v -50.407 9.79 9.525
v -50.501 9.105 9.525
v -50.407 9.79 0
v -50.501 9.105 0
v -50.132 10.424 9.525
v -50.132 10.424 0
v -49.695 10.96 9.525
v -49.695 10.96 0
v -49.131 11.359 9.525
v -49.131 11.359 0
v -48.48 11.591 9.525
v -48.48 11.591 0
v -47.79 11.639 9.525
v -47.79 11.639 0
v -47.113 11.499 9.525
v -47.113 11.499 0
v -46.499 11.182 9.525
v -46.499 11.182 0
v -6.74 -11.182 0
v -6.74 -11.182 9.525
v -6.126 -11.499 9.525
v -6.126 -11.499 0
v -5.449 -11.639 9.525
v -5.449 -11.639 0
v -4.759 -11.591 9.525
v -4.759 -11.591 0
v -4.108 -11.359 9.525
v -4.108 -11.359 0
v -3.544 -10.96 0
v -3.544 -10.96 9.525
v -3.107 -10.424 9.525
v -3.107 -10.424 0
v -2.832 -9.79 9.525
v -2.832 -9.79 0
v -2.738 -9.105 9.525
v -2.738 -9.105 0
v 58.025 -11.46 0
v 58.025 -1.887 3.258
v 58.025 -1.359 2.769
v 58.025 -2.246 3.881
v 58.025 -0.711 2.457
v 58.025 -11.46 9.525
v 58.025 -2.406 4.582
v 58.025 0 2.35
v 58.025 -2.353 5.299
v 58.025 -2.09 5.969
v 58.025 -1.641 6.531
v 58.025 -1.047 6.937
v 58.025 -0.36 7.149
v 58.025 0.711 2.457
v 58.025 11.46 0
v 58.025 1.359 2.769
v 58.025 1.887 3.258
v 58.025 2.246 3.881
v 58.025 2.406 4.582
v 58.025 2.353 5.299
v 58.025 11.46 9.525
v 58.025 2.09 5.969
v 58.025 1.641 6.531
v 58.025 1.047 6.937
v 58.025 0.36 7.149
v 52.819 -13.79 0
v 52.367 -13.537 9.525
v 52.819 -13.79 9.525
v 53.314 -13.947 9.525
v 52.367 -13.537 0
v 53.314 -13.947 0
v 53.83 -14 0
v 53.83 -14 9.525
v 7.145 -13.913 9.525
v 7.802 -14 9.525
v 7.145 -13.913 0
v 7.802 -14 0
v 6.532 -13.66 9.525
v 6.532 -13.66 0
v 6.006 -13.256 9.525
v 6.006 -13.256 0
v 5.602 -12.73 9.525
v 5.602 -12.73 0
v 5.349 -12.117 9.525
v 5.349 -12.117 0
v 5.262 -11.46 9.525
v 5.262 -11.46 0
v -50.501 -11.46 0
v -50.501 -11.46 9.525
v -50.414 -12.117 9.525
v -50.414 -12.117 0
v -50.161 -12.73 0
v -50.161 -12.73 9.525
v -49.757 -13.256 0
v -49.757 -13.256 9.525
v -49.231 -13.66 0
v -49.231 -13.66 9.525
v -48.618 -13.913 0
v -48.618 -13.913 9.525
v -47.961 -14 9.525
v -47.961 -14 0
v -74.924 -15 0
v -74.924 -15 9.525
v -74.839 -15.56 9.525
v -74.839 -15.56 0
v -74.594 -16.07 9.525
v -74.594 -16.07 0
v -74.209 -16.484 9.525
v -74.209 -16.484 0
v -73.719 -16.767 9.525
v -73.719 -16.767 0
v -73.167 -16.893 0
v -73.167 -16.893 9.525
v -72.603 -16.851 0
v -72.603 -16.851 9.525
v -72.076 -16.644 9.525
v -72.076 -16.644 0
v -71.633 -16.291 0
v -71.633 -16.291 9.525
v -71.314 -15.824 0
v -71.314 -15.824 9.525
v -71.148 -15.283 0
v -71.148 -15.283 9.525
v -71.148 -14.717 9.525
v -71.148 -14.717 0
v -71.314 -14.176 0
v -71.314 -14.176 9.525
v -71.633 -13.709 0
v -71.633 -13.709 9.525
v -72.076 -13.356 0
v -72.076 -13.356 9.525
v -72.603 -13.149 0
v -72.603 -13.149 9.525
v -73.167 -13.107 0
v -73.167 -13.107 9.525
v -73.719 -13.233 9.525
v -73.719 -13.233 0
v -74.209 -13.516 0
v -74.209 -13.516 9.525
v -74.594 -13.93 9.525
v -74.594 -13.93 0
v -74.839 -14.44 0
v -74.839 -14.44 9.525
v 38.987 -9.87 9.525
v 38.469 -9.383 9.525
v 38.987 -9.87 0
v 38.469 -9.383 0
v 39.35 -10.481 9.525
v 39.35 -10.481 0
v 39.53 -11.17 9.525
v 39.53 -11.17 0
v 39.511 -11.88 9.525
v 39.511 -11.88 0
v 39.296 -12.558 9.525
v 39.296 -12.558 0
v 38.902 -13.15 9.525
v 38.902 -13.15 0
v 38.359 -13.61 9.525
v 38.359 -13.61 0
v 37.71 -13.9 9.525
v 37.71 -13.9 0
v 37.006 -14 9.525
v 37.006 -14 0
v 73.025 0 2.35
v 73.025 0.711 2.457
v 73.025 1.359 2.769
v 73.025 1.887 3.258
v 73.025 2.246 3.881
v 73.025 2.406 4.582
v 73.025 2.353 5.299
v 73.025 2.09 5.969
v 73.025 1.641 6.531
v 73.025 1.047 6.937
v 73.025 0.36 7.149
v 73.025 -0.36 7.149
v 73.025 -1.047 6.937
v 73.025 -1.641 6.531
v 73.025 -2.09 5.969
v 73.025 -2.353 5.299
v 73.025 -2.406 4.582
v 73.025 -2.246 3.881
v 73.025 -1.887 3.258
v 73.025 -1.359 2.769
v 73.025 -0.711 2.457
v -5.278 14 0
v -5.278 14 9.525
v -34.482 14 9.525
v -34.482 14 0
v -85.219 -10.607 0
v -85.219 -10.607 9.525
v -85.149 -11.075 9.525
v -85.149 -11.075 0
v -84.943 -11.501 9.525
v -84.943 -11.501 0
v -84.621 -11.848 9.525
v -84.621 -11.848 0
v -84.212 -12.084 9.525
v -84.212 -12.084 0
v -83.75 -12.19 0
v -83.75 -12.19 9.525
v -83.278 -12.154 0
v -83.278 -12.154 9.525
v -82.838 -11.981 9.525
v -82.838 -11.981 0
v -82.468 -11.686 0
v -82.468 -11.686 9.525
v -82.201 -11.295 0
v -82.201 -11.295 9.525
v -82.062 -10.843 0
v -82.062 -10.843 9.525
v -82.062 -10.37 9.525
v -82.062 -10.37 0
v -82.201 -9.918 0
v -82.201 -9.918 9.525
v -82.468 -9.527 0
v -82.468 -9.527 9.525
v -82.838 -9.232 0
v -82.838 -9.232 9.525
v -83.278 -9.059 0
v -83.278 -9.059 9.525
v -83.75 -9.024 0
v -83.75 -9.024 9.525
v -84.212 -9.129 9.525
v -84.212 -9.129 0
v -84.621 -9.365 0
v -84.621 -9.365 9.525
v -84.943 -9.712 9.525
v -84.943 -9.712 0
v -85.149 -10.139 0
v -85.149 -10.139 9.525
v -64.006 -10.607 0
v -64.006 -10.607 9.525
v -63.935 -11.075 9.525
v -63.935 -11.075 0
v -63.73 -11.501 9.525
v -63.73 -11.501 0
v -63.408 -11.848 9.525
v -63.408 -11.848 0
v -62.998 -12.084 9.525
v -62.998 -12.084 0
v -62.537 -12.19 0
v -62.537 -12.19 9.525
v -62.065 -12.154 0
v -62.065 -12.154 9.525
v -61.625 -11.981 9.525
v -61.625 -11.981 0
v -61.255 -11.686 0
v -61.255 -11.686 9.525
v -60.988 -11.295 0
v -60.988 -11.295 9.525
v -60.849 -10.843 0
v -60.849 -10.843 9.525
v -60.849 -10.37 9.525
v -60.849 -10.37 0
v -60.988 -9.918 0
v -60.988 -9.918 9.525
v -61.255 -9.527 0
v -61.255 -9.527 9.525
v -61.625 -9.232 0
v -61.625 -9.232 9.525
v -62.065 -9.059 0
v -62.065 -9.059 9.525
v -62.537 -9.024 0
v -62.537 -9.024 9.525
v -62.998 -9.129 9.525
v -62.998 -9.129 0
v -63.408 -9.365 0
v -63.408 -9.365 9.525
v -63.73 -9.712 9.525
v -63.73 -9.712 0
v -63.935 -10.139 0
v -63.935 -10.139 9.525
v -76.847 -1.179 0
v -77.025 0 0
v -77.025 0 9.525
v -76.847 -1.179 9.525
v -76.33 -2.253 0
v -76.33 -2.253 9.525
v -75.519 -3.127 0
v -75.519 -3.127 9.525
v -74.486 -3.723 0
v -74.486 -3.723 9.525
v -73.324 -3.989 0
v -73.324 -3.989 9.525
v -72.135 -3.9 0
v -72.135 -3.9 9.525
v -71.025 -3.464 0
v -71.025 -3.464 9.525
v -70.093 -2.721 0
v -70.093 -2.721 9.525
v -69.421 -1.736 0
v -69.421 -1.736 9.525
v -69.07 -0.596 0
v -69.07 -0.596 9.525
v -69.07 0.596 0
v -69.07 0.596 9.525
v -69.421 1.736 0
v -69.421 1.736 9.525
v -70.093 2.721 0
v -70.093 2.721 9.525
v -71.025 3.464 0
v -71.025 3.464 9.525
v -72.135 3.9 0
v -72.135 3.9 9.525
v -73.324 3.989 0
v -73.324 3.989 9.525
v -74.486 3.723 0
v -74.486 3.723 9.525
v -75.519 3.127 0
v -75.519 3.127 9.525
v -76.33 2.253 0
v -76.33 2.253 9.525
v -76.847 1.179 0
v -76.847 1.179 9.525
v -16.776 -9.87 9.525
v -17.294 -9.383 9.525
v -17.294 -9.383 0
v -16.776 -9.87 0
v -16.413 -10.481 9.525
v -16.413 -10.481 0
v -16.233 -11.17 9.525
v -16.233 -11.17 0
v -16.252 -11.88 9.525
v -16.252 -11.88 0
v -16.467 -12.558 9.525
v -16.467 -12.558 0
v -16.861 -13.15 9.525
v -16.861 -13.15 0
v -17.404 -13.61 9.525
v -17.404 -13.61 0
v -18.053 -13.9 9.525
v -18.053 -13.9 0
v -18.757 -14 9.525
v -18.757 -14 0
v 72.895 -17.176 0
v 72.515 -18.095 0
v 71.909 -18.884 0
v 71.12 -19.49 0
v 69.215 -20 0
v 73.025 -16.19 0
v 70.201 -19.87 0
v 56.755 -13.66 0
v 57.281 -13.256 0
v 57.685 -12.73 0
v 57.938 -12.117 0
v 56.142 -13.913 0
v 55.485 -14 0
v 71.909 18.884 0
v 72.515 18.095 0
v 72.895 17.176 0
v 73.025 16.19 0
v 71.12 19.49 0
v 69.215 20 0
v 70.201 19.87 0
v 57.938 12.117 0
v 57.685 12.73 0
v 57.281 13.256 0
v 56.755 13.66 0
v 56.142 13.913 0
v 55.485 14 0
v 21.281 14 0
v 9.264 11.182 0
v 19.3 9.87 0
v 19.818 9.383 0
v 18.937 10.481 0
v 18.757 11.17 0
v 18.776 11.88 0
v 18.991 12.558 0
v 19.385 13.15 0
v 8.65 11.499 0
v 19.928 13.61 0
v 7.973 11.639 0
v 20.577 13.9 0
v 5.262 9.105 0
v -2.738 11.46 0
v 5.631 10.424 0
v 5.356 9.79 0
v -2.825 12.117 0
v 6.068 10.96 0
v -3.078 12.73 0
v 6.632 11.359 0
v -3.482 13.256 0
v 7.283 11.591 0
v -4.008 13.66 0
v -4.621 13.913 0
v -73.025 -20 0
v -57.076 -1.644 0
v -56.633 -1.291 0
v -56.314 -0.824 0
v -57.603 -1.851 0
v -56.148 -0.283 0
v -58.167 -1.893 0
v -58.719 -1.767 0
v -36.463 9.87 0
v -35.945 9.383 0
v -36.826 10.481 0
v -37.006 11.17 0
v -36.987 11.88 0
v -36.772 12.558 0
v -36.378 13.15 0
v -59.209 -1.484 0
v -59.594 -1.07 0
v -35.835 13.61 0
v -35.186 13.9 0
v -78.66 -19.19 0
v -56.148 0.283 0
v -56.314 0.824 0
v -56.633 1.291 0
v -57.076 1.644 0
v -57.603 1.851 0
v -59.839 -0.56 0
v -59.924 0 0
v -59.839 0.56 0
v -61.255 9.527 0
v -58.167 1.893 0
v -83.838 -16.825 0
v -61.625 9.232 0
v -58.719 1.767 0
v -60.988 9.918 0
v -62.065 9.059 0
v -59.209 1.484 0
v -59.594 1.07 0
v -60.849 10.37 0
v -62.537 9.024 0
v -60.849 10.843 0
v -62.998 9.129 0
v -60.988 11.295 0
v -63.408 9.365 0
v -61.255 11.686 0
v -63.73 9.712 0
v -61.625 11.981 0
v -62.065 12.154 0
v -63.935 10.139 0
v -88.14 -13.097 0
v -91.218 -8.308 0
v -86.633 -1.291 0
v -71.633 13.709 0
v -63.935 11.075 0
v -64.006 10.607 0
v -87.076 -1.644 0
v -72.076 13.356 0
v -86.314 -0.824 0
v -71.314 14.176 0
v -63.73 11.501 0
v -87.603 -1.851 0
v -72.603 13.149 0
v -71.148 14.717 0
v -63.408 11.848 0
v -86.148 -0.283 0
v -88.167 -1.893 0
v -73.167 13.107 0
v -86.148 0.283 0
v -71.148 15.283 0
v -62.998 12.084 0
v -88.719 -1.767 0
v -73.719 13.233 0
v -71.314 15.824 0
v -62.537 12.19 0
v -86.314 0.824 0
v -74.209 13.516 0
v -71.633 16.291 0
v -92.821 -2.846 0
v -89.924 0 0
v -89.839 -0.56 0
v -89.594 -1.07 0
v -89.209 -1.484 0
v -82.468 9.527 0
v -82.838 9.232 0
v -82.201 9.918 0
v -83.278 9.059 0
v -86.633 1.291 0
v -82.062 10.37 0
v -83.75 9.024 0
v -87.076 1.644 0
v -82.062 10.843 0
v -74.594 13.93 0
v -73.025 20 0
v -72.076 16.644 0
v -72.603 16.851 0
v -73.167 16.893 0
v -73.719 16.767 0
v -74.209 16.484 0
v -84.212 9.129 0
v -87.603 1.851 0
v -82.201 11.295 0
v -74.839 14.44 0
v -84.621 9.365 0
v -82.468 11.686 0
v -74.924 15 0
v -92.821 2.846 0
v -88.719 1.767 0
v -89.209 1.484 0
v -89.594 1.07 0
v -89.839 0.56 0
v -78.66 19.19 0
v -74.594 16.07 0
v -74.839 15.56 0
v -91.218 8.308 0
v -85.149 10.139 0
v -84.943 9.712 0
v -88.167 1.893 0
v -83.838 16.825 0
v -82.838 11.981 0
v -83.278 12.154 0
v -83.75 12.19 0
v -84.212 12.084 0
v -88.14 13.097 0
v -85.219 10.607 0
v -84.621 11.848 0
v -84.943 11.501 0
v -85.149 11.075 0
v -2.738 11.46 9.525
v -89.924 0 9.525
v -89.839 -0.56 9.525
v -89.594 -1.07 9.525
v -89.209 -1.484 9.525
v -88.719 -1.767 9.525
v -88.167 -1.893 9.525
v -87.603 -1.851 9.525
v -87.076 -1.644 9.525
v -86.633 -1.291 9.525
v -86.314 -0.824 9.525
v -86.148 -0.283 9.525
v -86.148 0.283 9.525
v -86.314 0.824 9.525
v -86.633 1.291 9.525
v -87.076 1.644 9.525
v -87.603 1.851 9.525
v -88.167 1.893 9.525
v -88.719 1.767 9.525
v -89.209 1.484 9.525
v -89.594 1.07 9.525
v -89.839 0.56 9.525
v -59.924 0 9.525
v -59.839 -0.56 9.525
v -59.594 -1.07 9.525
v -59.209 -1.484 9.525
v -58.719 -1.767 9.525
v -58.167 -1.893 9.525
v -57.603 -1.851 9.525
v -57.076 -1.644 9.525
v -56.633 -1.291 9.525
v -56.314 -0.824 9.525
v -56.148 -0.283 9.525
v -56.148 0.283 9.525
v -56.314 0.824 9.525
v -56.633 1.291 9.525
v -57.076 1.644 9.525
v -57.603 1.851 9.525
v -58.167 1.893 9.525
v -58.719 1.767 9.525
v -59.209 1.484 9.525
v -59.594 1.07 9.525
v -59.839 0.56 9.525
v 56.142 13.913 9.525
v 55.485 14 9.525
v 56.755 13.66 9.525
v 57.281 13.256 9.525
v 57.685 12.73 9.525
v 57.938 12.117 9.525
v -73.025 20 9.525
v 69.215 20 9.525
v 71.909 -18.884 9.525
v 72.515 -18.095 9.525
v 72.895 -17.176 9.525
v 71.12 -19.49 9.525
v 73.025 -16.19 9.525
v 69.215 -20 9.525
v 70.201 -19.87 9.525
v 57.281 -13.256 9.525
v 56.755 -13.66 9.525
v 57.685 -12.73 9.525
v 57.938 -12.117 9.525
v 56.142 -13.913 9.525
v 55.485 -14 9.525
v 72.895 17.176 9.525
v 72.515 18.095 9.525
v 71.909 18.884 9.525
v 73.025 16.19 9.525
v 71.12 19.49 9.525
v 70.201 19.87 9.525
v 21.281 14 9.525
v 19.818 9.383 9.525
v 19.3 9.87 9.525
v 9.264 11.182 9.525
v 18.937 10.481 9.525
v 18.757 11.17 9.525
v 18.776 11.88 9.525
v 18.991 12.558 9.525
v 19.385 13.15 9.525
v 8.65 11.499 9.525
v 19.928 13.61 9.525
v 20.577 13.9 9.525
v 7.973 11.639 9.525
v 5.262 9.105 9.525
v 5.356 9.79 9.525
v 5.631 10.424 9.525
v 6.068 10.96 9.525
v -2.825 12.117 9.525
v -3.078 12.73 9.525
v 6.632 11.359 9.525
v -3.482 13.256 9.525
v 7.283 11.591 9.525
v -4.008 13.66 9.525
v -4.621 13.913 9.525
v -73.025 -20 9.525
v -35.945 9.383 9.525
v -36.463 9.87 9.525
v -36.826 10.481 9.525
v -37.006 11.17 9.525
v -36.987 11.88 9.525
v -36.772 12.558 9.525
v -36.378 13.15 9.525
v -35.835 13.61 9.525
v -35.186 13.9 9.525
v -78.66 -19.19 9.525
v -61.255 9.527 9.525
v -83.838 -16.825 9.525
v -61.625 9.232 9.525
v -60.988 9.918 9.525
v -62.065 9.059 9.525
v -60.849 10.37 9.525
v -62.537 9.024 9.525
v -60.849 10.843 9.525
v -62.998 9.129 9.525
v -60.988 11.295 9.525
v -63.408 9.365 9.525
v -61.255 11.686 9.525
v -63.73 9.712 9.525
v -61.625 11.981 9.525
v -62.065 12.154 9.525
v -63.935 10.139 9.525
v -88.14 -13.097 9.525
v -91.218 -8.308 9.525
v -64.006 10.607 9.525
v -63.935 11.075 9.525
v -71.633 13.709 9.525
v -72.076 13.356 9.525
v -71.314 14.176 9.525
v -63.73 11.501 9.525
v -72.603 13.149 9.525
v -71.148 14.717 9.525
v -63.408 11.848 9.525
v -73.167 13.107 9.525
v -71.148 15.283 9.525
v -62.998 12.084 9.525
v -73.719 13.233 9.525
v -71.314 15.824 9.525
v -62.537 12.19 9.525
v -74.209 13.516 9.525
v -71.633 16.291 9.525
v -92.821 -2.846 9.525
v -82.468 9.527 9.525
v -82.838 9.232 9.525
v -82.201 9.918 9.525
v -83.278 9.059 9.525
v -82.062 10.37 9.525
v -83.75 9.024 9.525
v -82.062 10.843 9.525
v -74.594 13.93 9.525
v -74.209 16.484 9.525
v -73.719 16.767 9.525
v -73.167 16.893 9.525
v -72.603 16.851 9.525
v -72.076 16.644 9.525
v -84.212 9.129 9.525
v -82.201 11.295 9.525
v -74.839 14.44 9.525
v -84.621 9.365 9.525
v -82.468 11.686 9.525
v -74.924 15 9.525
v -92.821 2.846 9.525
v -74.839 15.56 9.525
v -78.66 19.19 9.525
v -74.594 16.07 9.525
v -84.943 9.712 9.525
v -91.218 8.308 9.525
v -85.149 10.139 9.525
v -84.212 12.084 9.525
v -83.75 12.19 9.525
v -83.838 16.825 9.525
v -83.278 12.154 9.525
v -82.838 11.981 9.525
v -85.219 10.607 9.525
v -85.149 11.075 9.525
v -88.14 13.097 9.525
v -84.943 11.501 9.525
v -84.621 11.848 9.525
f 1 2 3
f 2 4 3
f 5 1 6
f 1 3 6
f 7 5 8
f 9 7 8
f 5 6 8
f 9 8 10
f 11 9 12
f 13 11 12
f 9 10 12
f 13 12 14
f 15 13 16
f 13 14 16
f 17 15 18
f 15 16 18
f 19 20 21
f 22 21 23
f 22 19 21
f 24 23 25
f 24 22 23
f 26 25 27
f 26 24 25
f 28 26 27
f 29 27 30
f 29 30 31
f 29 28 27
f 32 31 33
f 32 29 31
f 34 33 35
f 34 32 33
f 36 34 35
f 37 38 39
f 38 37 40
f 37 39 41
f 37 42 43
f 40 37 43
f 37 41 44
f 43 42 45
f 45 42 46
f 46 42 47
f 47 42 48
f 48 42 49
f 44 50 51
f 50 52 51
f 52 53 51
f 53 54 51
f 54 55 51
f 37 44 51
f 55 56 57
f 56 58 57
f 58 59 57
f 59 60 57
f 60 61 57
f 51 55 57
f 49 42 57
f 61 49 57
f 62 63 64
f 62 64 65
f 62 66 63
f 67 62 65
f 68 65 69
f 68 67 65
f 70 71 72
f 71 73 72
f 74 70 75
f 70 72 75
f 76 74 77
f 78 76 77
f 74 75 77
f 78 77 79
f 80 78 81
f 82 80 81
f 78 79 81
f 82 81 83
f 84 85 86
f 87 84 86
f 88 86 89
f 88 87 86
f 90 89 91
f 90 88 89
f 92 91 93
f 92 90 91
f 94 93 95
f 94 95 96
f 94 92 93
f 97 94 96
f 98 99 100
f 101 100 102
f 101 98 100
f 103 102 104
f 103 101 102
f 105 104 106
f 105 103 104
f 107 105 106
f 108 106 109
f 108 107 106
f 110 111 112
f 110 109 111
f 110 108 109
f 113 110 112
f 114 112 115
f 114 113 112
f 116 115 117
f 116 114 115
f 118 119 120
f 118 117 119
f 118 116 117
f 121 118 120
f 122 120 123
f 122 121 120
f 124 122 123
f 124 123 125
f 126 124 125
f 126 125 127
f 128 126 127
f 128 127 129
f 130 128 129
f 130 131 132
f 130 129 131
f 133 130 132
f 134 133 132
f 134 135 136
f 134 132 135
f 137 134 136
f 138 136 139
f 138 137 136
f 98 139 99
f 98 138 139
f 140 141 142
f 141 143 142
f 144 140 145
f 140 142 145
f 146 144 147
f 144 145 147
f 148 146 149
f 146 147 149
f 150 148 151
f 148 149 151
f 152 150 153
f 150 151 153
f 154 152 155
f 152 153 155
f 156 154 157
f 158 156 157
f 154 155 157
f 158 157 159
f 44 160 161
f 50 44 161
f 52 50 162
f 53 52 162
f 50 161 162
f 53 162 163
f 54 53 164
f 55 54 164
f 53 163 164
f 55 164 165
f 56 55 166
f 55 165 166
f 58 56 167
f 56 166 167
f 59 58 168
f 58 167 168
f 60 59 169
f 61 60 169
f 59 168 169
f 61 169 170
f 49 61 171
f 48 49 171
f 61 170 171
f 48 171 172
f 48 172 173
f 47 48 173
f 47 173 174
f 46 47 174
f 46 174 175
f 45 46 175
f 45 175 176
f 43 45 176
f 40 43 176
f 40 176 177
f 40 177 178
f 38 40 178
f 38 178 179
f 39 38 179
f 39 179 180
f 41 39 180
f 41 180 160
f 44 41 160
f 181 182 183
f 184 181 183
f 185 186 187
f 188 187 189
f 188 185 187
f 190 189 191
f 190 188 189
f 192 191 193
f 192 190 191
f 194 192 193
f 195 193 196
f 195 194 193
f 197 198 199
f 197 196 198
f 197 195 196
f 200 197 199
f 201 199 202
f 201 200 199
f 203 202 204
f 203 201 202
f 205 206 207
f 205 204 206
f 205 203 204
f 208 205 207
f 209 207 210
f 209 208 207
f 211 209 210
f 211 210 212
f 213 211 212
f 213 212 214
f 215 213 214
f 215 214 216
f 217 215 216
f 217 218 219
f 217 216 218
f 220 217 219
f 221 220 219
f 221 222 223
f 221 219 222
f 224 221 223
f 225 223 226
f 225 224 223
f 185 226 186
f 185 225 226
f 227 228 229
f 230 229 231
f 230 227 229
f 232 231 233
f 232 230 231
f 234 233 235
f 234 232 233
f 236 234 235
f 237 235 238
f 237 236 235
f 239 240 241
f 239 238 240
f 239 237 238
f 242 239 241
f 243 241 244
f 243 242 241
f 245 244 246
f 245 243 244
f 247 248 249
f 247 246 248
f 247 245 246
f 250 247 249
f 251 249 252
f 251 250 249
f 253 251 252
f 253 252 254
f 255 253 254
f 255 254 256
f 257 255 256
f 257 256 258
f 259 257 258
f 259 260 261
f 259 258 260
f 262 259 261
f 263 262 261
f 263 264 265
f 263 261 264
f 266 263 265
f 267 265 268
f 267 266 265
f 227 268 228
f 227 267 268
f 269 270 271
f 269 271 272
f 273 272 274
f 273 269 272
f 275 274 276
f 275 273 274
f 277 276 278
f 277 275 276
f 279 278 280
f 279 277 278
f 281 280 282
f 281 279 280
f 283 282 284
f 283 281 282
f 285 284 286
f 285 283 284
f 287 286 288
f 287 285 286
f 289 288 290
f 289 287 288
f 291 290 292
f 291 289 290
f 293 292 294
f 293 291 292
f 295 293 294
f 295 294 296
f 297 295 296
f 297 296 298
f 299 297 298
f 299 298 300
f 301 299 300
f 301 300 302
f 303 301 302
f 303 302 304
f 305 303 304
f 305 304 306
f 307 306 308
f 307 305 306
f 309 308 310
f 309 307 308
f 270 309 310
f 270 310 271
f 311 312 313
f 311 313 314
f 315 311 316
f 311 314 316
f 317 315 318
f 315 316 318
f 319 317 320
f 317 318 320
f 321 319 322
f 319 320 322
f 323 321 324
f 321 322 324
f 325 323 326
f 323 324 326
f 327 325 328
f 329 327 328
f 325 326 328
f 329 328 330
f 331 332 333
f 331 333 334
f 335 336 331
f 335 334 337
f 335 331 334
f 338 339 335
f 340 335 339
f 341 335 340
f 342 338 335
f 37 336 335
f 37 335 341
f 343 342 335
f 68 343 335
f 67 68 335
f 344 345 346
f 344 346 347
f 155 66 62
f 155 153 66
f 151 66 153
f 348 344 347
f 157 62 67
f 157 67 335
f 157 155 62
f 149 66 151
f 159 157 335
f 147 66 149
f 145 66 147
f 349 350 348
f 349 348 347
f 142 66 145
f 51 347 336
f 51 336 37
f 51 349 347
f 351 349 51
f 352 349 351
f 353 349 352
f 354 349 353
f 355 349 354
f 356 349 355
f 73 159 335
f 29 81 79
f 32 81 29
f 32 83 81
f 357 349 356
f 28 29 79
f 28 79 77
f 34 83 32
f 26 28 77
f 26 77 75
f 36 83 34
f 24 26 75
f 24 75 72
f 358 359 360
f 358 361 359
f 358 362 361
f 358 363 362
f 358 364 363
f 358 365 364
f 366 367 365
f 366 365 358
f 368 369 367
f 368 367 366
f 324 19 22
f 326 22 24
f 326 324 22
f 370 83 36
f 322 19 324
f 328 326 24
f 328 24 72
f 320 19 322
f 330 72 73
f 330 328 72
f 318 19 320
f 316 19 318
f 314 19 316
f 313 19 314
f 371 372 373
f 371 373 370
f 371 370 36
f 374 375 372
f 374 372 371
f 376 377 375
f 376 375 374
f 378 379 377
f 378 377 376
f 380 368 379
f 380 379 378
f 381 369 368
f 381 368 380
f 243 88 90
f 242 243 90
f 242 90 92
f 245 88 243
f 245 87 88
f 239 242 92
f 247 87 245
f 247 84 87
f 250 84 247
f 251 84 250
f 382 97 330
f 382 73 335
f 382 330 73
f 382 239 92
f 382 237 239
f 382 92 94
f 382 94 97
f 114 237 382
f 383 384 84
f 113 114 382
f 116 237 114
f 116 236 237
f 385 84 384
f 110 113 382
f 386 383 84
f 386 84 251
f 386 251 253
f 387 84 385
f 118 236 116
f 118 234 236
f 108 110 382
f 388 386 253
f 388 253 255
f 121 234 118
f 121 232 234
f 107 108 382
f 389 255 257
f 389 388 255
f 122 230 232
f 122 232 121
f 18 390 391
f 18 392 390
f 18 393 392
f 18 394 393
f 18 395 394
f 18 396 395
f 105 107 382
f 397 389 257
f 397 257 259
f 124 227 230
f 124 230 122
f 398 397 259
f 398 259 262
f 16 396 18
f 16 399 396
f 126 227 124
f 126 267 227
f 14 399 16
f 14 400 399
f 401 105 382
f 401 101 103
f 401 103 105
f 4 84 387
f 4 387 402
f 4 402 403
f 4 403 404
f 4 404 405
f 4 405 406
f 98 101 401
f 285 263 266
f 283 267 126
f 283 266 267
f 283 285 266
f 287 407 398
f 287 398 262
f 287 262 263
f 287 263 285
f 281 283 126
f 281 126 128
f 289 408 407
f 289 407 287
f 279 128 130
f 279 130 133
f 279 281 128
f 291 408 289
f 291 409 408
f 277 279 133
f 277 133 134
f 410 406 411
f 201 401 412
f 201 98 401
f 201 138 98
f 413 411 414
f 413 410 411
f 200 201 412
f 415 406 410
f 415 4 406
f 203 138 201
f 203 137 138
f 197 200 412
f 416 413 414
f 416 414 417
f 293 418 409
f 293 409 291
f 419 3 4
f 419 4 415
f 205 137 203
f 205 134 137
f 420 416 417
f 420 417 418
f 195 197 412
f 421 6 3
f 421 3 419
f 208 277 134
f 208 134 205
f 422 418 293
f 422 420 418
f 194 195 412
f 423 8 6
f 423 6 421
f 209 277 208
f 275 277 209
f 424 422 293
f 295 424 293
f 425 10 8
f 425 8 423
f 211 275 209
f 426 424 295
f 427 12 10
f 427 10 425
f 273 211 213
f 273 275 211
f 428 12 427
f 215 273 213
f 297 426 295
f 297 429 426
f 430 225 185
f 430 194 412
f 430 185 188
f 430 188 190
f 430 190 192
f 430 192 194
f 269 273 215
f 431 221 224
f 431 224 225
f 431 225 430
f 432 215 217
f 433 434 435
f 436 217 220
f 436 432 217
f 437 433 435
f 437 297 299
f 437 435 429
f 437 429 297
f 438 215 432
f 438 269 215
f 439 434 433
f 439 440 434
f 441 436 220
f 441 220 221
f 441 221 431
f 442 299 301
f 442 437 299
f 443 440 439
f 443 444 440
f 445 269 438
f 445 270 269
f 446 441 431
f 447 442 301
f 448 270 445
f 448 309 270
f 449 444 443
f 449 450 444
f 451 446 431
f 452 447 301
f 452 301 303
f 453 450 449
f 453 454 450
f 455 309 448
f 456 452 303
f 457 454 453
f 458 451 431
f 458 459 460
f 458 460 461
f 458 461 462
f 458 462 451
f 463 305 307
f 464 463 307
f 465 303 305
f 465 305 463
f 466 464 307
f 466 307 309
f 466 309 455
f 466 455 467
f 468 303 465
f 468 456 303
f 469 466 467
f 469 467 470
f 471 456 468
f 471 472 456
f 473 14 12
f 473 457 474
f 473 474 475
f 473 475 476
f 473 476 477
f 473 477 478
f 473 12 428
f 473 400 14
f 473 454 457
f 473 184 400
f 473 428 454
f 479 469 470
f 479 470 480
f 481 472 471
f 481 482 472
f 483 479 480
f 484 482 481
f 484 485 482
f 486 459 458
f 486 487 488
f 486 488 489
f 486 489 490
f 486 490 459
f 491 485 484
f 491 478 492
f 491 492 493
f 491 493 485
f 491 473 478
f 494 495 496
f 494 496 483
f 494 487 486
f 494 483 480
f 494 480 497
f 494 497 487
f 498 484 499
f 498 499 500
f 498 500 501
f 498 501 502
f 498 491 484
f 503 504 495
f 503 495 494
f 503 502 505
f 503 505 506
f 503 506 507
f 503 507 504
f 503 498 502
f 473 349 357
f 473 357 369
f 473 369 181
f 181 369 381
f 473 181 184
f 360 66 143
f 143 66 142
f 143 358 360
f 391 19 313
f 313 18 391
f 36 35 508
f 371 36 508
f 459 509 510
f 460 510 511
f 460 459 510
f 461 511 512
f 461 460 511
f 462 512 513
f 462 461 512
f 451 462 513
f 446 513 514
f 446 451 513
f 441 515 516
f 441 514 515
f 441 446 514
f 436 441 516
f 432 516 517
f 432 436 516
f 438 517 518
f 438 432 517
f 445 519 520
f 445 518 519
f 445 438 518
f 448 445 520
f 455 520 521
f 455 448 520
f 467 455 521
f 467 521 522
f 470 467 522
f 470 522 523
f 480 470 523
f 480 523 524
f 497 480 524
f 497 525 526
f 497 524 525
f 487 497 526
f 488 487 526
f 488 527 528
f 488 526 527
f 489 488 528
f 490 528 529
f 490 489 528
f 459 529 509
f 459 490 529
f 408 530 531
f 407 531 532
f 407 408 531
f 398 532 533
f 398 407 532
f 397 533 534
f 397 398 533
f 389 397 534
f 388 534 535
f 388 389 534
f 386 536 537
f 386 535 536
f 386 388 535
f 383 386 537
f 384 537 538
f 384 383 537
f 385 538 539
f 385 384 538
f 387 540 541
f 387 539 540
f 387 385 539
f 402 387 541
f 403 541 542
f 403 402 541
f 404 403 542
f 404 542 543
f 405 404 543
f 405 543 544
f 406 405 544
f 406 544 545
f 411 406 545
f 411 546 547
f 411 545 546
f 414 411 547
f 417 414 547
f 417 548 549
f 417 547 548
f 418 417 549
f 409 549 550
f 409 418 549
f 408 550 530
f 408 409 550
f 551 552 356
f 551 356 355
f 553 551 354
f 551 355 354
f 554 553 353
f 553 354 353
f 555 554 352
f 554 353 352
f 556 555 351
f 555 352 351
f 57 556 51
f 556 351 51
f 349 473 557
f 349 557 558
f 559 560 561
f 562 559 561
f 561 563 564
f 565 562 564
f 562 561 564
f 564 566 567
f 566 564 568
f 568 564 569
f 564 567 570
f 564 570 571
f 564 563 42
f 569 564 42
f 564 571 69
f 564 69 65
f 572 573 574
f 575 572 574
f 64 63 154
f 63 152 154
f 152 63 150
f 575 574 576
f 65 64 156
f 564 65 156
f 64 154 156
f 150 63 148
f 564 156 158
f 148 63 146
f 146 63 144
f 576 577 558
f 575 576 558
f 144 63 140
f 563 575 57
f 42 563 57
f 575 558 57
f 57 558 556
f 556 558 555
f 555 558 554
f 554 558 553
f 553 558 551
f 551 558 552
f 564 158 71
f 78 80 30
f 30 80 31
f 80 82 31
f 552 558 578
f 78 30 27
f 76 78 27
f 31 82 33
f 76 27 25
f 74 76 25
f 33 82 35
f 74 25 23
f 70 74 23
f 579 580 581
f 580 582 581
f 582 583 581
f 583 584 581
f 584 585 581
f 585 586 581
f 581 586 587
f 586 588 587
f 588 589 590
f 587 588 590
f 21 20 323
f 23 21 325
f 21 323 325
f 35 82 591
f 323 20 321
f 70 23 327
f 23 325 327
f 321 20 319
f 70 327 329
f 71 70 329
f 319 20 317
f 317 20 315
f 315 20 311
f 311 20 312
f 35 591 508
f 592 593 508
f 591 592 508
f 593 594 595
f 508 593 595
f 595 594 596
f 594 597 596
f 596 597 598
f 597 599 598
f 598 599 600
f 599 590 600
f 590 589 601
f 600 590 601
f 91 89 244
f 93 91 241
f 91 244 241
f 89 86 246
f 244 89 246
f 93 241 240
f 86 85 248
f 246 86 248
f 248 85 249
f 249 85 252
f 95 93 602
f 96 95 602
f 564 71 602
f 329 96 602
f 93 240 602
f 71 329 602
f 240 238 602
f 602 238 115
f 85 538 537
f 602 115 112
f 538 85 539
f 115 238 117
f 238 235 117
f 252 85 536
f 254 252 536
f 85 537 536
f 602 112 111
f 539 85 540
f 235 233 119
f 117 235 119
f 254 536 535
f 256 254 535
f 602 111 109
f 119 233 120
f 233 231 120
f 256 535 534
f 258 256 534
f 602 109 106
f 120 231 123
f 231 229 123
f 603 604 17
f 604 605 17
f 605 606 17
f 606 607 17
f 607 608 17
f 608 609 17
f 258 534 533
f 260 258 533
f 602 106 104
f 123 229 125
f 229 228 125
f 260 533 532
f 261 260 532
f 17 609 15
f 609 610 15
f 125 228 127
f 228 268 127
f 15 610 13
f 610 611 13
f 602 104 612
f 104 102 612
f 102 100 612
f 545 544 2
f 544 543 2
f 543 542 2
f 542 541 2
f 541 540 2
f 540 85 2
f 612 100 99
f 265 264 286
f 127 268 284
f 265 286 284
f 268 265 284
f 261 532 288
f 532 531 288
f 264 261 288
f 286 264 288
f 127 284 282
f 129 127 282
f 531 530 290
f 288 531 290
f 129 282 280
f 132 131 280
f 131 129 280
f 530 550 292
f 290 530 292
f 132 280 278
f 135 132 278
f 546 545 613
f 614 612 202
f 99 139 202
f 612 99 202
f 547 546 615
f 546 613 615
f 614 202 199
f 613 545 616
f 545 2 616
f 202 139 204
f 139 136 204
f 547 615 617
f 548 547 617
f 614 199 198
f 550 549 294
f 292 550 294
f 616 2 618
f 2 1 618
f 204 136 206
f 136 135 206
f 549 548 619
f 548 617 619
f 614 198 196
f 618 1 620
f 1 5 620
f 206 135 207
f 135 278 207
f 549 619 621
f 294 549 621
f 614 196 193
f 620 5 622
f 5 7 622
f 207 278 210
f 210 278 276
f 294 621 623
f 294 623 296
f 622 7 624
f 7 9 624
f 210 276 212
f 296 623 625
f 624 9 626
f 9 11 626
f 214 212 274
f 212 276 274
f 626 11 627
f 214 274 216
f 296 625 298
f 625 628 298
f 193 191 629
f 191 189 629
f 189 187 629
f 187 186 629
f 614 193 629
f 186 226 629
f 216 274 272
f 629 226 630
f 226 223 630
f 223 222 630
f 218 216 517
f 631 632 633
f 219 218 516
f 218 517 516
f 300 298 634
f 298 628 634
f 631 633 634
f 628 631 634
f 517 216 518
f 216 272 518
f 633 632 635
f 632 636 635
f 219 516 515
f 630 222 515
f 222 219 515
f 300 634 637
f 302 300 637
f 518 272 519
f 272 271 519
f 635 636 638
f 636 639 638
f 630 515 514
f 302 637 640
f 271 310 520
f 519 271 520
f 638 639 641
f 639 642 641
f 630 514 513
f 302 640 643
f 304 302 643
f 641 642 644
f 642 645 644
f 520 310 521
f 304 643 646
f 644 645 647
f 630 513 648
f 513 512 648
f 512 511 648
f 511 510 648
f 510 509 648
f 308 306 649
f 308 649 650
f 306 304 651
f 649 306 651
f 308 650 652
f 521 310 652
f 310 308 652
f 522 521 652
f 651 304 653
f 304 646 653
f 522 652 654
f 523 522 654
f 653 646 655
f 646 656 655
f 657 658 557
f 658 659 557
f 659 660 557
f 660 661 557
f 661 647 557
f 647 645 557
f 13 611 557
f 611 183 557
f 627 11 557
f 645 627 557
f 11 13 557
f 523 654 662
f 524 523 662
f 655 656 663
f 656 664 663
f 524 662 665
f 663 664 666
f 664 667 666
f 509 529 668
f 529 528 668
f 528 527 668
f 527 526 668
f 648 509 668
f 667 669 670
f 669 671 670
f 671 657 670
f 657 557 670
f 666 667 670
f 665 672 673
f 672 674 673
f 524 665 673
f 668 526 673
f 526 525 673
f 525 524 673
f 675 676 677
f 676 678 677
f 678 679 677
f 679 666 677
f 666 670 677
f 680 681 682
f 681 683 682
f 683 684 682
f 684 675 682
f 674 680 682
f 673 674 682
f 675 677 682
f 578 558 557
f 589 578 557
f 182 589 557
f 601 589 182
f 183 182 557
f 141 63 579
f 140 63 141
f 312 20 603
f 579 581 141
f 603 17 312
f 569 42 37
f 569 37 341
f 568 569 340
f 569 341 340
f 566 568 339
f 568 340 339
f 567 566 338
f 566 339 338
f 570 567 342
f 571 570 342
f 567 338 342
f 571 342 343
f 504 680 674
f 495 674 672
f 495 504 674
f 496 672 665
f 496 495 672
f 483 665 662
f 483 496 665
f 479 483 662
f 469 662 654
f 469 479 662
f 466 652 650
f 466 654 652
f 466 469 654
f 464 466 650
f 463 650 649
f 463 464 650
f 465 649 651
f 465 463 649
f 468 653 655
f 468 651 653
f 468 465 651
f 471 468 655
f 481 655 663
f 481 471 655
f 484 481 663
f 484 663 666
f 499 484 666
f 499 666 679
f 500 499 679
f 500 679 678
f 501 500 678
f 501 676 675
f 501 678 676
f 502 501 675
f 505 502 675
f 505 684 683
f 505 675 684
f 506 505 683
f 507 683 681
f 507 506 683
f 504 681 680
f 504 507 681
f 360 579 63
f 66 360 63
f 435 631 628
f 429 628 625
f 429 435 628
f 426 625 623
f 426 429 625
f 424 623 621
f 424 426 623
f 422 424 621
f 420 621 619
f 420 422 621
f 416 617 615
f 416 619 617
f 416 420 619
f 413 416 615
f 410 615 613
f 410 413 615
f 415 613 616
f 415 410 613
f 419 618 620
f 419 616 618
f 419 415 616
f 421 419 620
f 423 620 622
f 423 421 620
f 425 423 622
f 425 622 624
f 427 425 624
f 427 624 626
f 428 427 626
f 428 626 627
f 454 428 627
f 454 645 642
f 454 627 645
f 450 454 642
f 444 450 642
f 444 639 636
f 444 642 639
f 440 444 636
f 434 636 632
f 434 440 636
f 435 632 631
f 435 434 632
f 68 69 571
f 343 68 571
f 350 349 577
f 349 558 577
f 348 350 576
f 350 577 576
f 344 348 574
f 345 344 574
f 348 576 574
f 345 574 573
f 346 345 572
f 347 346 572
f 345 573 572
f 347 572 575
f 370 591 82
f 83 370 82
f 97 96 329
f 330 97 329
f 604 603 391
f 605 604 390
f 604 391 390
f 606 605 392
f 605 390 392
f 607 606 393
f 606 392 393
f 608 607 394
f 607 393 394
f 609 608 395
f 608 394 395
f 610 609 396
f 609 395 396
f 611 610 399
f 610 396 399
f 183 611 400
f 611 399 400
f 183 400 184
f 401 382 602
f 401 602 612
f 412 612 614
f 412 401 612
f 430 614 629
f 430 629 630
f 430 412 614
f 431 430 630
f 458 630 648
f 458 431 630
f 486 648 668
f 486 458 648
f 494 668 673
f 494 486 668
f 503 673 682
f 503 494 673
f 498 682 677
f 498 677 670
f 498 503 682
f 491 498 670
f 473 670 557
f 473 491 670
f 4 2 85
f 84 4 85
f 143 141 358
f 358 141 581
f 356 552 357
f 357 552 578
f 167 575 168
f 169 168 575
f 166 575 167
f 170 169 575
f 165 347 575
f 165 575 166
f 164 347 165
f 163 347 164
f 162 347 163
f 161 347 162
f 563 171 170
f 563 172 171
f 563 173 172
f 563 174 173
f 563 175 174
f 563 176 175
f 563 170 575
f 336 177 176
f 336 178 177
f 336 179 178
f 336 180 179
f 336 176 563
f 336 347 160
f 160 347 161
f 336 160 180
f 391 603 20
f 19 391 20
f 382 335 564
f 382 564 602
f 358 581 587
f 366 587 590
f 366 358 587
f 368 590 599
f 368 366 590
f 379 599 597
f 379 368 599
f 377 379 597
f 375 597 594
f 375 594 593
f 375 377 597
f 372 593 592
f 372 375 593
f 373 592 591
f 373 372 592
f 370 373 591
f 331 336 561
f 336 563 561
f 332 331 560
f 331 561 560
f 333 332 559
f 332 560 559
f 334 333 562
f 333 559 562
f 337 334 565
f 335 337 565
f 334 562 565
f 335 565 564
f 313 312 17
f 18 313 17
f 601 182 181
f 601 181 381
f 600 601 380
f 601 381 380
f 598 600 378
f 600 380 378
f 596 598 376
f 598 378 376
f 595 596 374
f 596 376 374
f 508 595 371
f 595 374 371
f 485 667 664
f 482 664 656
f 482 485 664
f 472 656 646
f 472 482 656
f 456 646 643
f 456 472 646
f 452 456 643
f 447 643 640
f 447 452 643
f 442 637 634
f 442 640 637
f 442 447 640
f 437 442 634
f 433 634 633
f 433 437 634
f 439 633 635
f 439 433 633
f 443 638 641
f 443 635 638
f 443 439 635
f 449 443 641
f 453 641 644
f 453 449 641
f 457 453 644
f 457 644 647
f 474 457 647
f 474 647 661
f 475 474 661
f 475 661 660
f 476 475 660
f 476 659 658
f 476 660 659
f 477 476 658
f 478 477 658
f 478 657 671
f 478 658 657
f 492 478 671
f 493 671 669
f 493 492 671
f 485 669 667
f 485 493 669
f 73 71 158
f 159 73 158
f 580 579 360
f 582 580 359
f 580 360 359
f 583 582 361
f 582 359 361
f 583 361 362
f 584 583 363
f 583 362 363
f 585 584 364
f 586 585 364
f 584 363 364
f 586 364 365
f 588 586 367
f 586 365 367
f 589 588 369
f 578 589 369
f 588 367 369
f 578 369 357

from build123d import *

# Parameters (mm, degrees)
SKETCH1_R           = 4
BOSS_EXTRUDE1_DEPTH = 9.525
SKETCH3_R           = 1.89865
SKETCH3_R_2         = 1.5875
CUT_EXTRUDE2_DEPTH  = 96.626232018
CUT_EXTRUDE6_DEPTH  = 96.626232018
FILLET1_R           = 2.54
CUT_EXTRUDE10_REACH = 169.521
SKETCH18_R          = 2.413
FILLET2_R           = 3.81


with BuildPart() as part:
    # Sketch1 → Boss-Extrude1 (new body)
    with BuildSketch(Plane.XY):
        with BuildLine():
            Line((-73.025, 20), (73.025, 20))
            Line((73.025, 20), (73.025, -20))
            Line((73.025, -20), (-73.025, -20))
            ThreePointArc((-73.025, -20), (-93.025, 0), (-73.025, 20))
        make_face()
        with Locations(Location((-73.025, 0, 0), (0, 0, 180))):
            Circle(SKETCH1_R, mode=Mode.SUBTRACT)
    extrude(amount=BOSS_EXTRUDE1_DEPTH)

    # Sketch3 → Cut-Extrude2 (cut, through all)
    with BuildSketch(Plane.XY):
        with Locations(Location((-73.025, 15, 0), (0, 0, 180))):
            Circle(SKETCH3_R)
        with Locations(Location((-58.025, 0, 0), (0, 0, 180))):
            Circle(SKETCH3_R)
        with Locations(Location((-73.025, -15, 0), (0, 0, 180))):
            Circle(SKETCH3_R)
        with Locations(Location((-88.025, 0, 0), (0, 0, 180))):
            Circle(SKETCH3_R)
        with Locations(Location((-83.631601718, 10.606601718, 0), (0, 0, 180))):
            Circle(SKETCH3_R_2)
        with Locations(Location((-62.418398282, 10.606601718, 0), (0, 0, 180))):
            Circle(SKETCH3_R_2)
        with Locations(Location((-62.418398282, -10.606601718, 0), (0, 0, 180))):
            Circle(SKETCH3_R_2)
        with Locations(Location((-83.631601718, -10.606601718, 0), (0, 0, 180))):
            Circle(SKETCH3_R_2)
    extrude(amount=CUT_EXTRUDE2_DEPTH, mode=Mode.SUBTRACT)

    # Sketch8 → Cut-Extrude6 (cut, through all)
    with BuildSketch(Plane.XY.offset(9.525)):
        Polygon((-50.501, 14), (-50.501, -14), (-10.738, -14), align=None)
        Polygon((-42.501, 14), (-2.738, -14), (-2.738, 14), align=None)
        Polygon((53.025, 14), (13.262, 14), (53.025, -14), (58.025, -14), (58.025, 14), align=None)
        Polygon((45.025, -14), (5.262, 14), (5.262, -14), align=None)
    extrude(amount=-CUT_EXTRUDE6_DEPTH, mode=Mode.SUBTRACT)

    # Fillet1
    fillet1_edges = [part.edges().sort_by_distance(p)[0] for p in [
        (58.025, -14, 4.7625),
        (53.025, -14, 4.7625),
        (13.262, 14, 4.7625),
        (58.025, 14, 4.7625),
        (5.262, -14, 4.7625),
        (5.262, 14, 4.7625),
        (45.025, -14, 4.7625),
        (-50.501, 14, 4.7625),
        (-10.738, -14, 4.7625),
        (-50.501, -14, 4.7625),
        (-2.738, 14, 4.7625),
        (-2.738, -14, 4.7625),
        (-42.501, 14, 4.7625),
    ]]
    fillet(fillet1_edges, radius=FILLET1_R)

    # Sketch18 → Cut-Extrude10 (cut, up to next)
    with BuildSketch(Plane(origin=(73.025, 0, 0), x_dir=(0, 0, -1), z_dir=(1, 0, 0)), mode=Mode.PRIVATE) as cut_extrude10_sk1:
        with Locations((-4.7625, 0)):
            Circle(SKETCH18_R)
    cut_extrude10_tool1 = extrude(cut_extrude10_sk1.sketch, amount=-CUT_EXTRUDE10_REACH, mode=Mode.PRIVATE) & part.part
    add(cut_extrude10_tool1.solids().sort_by_distance((73.025, 0, 4.7625))[0], mode=Mode.SUBTRACT)

    # Fillet2
    fillet2_edges = [part.edges().sort_by_distance(p)[0] for p in [
        (73.025, -20, 4.7625),
        (73.025, 20, 4.7625),
    ]]
    fillet(fillet2_edges, radius=FILLET2_R)


solid = part.part
